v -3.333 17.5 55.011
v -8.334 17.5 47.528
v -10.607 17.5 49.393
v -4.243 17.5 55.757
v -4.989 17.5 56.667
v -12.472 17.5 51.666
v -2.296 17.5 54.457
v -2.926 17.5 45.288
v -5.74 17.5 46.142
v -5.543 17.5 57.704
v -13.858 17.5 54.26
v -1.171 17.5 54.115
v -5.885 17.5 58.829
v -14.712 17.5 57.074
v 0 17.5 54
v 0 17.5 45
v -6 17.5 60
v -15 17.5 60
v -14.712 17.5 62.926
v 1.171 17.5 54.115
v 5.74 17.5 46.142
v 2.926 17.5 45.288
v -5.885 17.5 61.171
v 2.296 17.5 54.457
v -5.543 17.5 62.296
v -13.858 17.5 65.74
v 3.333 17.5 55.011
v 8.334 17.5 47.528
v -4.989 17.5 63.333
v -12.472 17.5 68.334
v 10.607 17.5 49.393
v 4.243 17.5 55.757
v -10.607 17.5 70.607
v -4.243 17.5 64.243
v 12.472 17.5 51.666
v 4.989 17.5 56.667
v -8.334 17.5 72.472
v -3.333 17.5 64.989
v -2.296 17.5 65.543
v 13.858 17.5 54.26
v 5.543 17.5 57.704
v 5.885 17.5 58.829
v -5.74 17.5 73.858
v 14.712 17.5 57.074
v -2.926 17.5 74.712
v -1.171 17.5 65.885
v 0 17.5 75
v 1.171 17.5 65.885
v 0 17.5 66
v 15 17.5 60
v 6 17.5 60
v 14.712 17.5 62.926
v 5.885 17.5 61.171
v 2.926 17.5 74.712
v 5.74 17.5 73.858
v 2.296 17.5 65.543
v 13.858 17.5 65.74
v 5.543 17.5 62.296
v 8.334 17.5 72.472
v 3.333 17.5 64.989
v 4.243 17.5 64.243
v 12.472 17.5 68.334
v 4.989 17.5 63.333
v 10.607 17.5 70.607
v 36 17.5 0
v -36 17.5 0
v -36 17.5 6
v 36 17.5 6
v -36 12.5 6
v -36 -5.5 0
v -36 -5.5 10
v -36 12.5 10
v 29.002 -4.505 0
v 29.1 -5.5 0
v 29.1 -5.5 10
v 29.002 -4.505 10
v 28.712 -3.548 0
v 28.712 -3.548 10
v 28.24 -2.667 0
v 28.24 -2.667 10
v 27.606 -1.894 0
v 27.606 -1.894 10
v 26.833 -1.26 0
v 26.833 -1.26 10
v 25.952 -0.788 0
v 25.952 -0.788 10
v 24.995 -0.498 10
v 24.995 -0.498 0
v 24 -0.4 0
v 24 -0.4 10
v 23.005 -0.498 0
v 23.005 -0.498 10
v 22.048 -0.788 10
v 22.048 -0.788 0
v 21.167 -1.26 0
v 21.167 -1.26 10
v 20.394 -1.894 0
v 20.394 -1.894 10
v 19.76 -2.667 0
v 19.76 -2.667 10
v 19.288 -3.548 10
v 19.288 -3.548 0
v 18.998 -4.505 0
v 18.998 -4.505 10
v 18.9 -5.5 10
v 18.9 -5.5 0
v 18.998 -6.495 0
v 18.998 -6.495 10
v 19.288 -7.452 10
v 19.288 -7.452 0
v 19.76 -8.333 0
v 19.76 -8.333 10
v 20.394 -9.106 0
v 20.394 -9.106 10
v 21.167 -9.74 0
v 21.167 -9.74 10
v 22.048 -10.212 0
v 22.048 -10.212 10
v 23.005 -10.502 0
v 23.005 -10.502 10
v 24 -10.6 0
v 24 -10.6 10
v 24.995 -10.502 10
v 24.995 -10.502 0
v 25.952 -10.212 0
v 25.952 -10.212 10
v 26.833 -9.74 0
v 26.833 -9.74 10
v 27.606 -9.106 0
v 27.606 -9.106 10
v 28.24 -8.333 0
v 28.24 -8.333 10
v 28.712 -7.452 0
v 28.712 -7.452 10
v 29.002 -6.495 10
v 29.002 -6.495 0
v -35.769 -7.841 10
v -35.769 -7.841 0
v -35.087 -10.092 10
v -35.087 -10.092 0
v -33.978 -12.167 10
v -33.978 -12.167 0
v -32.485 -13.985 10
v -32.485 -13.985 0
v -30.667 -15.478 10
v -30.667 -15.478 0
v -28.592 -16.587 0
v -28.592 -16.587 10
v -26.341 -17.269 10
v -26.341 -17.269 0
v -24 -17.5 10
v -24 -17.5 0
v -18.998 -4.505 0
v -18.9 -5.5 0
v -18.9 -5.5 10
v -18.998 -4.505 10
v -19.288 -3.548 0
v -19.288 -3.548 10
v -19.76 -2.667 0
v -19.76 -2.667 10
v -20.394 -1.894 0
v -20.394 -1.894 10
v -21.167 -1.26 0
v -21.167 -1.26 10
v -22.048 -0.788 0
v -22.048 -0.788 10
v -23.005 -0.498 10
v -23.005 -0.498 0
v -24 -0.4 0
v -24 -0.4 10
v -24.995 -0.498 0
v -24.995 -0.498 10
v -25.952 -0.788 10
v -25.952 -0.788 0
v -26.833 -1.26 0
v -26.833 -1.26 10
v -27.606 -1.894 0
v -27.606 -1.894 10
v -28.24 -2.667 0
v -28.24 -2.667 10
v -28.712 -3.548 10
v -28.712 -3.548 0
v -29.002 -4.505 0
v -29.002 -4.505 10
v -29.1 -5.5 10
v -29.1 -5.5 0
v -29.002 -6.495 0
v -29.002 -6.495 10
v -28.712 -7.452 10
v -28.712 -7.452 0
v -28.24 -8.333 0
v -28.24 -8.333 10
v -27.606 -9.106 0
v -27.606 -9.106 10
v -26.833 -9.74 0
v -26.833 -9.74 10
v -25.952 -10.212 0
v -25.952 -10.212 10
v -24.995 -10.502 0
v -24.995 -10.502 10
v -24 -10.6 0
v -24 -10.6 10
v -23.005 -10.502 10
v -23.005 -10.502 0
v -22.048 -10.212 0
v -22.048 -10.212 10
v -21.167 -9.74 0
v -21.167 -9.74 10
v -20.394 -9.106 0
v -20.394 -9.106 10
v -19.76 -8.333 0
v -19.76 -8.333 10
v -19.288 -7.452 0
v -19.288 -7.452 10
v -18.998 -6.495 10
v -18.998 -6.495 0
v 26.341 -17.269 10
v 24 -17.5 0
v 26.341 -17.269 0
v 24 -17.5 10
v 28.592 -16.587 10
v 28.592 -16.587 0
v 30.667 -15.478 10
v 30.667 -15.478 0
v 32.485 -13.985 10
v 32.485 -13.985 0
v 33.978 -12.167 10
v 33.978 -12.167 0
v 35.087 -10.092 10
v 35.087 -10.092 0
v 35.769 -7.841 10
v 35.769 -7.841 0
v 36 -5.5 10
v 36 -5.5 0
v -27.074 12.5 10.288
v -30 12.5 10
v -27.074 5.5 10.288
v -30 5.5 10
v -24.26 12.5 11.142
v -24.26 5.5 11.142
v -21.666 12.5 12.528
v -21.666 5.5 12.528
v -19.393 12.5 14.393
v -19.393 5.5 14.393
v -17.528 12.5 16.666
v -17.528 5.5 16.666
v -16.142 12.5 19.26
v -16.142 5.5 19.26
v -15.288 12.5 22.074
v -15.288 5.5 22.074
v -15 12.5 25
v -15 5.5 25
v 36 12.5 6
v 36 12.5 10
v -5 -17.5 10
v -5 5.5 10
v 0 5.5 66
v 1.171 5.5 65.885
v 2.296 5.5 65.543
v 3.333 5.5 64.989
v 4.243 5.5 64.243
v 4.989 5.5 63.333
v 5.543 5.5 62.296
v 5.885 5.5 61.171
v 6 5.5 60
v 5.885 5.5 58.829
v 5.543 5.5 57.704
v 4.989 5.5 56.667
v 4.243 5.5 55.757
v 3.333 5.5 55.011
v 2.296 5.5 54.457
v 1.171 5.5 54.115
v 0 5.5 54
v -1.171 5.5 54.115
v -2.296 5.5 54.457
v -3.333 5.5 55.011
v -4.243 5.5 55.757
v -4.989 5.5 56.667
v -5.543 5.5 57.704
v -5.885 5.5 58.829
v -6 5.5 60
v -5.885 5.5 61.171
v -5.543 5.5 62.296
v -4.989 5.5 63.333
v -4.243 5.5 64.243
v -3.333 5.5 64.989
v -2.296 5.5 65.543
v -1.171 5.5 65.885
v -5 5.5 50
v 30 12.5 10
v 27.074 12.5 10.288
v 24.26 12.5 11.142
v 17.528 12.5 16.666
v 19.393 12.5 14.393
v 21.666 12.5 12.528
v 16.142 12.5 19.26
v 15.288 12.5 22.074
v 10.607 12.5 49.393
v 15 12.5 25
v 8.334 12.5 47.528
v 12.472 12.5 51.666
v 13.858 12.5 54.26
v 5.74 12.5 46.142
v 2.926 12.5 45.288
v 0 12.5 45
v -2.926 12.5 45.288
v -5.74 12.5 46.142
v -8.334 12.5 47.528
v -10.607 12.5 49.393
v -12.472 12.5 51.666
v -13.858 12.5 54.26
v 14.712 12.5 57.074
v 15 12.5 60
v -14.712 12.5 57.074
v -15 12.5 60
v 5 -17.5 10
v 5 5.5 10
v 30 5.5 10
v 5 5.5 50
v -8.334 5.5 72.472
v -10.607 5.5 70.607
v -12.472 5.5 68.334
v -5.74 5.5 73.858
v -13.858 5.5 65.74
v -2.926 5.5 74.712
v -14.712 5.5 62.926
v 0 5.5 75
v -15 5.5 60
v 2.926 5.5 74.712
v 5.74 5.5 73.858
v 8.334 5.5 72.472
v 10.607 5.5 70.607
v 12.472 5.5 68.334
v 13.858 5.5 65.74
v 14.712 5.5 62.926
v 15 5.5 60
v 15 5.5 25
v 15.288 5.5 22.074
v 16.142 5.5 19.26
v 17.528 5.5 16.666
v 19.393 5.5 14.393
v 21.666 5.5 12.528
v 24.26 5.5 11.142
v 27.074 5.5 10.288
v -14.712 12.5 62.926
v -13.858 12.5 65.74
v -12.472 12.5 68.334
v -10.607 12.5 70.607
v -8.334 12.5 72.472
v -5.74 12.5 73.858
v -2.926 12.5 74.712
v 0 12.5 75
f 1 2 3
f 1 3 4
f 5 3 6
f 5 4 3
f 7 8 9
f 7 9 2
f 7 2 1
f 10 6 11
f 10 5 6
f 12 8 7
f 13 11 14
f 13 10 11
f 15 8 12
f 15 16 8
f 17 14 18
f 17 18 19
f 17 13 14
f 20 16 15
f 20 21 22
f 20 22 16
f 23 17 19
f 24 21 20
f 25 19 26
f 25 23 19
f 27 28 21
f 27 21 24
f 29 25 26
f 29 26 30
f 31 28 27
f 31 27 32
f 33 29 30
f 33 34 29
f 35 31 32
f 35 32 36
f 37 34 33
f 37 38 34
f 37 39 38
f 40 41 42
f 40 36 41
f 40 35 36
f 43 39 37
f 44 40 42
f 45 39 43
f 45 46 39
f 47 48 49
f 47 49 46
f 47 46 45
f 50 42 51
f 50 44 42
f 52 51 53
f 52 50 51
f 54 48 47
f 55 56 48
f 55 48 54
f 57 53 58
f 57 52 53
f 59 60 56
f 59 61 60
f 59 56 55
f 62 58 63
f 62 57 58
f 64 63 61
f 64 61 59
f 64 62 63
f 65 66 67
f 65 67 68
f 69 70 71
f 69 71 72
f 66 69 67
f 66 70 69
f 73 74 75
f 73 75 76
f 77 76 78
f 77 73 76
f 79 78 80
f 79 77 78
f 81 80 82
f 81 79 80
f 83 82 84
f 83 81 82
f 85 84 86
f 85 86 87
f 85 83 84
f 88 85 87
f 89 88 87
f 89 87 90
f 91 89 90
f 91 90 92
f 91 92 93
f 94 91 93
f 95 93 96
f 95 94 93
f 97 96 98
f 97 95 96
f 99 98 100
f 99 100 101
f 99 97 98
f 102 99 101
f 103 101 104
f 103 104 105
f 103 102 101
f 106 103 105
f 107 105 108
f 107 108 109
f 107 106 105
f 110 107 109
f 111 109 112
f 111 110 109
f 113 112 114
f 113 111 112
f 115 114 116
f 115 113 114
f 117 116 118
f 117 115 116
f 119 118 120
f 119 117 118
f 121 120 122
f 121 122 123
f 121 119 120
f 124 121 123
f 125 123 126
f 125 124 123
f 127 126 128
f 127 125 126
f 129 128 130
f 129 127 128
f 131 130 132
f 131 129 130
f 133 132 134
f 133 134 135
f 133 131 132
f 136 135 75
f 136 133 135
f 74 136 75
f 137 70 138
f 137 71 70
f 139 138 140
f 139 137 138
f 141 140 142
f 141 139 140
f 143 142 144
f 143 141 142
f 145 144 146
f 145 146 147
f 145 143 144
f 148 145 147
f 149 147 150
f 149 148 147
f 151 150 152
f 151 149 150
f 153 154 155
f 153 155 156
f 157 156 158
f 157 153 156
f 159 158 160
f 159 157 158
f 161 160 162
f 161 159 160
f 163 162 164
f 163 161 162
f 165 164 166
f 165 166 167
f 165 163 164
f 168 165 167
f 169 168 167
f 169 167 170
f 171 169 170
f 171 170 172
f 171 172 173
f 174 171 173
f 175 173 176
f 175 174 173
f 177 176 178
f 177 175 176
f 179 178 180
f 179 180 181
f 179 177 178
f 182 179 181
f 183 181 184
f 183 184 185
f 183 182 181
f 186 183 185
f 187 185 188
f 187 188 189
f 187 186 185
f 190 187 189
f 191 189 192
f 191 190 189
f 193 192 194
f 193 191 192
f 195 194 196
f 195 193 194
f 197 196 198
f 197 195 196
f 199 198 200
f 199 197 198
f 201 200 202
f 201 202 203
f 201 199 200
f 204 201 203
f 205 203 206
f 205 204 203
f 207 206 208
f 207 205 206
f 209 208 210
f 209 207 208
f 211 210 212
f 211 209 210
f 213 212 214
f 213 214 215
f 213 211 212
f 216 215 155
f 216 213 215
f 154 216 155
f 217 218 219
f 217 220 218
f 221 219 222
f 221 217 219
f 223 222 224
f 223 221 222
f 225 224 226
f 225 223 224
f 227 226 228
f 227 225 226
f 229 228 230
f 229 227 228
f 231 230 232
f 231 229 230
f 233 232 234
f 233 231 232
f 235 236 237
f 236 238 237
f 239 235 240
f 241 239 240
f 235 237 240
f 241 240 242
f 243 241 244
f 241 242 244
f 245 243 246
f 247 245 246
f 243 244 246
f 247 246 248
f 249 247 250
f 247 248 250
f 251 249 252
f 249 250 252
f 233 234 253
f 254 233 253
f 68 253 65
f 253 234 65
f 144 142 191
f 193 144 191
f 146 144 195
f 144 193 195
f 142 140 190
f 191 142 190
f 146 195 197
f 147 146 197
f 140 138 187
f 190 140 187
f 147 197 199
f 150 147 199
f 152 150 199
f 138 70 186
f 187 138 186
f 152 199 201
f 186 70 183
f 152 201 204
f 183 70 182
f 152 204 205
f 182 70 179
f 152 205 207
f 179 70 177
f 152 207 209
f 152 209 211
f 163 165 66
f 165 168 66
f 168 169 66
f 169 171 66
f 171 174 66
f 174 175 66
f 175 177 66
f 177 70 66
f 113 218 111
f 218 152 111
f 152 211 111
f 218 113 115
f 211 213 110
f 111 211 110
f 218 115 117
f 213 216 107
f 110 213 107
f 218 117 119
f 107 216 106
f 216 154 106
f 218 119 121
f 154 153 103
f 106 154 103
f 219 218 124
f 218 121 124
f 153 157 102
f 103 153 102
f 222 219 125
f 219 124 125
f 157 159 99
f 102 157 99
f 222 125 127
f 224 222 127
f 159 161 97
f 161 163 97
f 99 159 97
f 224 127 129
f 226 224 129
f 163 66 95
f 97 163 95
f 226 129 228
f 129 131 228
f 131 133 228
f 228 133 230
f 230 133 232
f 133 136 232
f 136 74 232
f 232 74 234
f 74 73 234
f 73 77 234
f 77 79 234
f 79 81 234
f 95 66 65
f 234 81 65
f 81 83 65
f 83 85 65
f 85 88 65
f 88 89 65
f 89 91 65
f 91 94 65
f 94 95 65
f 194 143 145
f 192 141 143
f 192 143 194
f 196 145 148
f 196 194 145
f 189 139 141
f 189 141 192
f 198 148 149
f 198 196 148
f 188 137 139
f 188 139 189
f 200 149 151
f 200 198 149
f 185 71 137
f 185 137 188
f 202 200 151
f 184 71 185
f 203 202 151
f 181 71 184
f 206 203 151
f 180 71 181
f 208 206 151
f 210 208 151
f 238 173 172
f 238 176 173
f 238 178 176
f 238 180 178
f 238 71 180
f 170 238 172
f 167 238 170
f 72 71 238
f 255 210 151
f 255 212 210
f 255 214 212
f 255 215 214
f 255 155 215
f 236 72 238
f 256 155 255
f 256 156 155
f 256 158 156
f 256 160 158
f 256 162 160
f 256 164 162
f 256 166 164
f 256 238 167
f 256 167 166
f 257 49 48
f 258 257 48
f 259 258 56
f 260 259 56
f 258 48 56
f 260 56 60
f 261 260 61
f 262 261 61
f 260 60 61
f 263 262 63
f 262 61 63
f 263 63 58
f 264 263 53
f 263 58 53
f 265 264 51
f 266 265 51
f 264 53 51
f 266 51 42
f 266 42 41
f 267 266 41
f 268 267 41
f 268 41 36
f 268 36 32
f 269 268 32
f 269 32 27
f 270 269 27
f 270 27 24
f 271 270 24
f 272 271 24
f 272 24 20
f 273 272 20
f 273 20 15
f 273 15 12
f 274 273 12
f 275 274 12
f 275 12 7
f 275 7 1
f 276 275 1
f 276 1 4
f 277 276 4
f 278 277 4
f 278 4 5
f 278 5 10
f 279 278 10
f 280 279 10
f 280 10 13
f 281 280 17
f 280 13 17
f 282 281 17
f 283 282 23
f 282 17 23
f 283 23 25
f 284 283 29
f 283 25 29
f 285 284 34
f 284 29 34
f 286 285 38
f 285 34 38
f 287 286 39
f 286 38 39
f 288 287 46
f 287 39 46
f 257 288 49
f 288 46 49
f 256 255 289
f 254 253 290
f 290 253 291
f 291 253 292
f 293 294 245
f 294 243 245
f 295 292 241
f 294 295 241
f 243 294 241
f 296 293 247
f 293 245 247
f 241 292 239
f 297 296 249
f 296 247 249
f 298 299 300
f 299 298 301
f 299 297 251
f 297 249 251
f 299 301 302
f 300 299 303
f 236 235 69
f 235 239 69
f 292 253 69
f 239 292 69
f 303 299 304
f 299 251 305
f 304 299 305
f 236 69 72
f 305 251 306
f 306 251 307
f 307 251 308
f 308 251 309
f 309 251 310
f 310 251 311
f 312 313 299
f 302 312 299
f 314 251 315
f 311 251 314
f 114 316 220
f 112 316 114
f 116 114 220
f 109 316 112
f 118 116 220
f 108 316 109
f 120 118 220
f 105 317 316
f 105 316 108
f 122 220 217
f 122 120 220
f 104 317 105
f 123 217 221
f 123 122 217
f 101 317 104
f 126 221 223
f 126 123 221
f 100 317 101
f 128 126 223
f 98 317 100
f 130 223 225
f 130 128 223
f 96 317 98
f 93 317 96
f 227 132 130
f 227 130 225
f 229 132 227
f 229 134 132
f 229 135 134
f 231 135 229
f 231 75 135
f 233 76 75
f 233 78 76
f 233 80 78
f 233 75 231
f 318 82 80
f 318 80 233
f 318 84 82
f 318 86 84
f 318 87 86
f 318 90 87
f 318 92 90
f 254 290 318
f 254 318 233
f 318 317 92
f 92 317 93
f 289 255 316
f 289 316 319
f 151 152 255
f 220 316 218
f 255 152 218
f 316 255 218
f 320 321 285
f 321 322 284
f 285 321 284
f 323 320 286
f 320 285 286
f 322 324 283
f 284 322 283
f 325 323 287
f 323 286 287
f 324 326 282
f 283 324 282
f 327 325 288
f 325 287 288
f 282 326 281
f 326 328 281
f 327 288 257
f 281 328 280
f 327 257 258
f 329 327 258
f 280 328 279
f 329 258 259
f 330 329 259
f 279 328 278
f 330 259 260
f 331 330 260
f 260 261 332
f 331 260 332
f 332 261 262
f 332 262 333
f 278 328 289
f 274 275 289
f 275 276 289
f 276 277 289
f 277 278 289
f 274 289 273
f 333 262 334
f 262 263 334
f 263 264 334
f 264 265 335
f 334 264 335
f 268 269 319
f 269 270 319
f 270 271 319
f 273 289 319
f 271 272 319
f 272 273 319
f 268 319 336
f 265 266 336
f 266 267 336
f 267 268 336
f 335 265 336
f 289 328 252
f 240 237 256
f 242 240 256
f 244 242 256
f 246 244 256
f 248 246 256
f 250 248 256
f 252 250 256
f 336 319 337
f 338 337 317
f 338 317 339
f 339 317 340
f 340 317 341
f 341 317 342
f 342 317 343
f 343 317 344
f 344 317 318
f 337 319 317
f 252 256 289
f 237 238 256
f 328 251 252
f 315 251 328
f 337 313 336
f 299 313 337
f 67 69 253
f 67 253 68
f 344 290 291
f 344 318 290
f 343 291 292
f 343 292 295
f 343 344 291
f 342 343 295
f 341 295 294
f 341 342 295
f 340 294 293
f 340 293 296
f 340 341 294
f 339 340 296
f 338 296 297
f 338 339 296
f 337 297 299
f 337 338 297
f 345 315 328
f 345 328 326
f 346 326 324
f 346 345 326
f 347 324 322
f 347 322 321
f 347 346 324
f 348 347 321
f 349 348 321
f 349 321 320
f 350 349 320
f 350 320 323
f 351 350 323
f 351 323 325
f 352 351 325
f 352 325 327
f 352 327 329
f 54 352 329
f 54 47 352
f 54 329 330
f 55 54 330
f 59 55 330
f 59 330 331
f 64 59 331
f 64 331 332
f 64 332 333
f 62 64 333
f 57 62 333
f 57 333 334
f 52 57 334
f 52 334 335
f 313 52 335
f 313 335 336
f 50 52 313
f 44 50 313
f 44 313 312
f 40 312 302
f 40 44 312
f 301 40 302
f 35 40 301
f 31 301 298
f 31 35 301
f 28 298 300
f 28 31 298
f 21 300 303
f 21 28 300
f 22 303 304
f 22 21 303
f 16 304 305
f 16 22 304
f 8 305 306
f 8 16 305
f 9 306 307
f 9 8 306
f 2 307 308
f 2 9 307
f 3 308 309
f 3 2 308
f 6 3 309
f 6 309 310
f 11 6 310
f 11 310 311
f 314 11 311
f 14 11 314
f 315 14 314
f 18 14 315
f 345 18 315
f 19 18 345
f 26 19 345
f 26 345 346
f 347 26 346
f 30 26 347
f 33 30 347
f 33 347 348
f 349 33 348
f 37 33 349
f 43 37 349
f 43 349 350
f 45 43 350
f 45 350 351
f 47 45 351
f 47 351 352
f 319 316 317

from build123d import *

# Parameters (mm, degrees)
CROQUIS1_W              = 72
CROQUIS1_H              = 35
CROQUIS1_R              = 5.1
SALIENTE_EXTRUIR1_DEPTH = 10
REDONDEO1_R             = 12
CORTAR_EXTRUIR1_REACH   = 76.768
CROQUIS2_W              = 4
CROQUIS2_H              = 5
CROQUIS3_R              = 6
SALIENTE_EXTRUIR2_DEPTH = 7
SALIENTE_EXTRUIR4_START = 5
CROQUIS5_R              = 15
CROQUIS5_R_2            = 6
SALIENTE_EXTRUIR4_DEPTH = 5
REDONDEO2_R             = 15
NERVIO31_REACH          = 87.013
CROQUIS8_WALL_W         = 218.167556508
CROQUIS8_WALL_H         = 10


with BuildPart() as part:
    # Croquis1 → Saliente-Extruir1 (new body)
    with BuildSketch(Plane.XY):
        Rectangle(CROQUIS1_W, CROQUIS1_H)
        with Locations((-24, -5.5)):
            Circle(CROQUIS1_R, mode=Mode.SUBTRACT)
        with Locations((24, -5.5)):
            Circle(CROQUIS1_R, mode=Mode.SUBTRACT)
    extrude(amount=SALIENTE_EXTRUIR1_DEPTH)

    # Redondeo1
    redondeo1_edges = [part.edges().sort_by_distance(p)[0] for p in [
        (36, -17.5, 5),
        (-36, -17.5, 5),
    ]]
    fillet(redondeo1_edges, radius=REDONDEO1_R)

    # Croquis2 → Cortar-Extruir1 (cut, up to next)
    with BuildSketch(Plane.ZY.offset(36), mode=Mode.PRIVATE) as cortar_extruir1_sk1:
        with Locations((8, 15)):
            Rectangle(CROQUIS2_W, CROQUIS2_H)
    cortar_extruir1_tool1 = extrude(cortar_extruir1_sk1.sketch, amount=-CORTAR_EXTRUIR1_REACH, mode=Mode.PRIVATE) & part.part
    add(cortar_extruir1_tool1.solids().sort_by_distance((-36, 15, 8))[0], mode=Mode.SUBTRACT)

    # Croquis3 → Saliente-Extruir2 (add)
    with BuildSketch(Plane(origin=(0, 12.5, 0), x_dir=(1, 0, 0), z_dir=(0, 1, 0))):
        with BuildLine():
            Line((15, -60), (15, -10))
            Line((15, -10), (-15, -10))
            Line((-15, -10), (-15, -60))
            ThreePointArc((-15, -60), (0, -75), (15, -60))
        make_face()
        with Locations(Location((0, -60, 0), (0, 0, 270))):
            Circle(CROQUIS3_R, mode=Mode.SUBTRACT)
    extrude(amount=-SALIENTE_EXTRUIR2_DEPTH)

    # Croquis5 → Saliente-Extruir4 (add)
    with BuildSketch(Plane(origin=(0, 12.5, 0), x_dir=(1, 0, 0), z_dir=(0, 1, 0)).offset(SALIENTE_EXTRUIR4_START)):
        with Locations(Location((0, -60, 0), (0, 0, 270))):
            Circle(CROQUIS5_R)
        with Locations(Location((0, -60, 0), (0, 0, 270))):
            Circle(CROQUIS5_R_2, mode=Mode.SUBTRACT)
    extrude(amount=-SALIENTE_EXTRUIR4_DEPTH)

    # Redondeo2
    redondeo2_edges = [part.edges().sort_by_distance(p)[0] for p in [
        (-15, 9, 10),
        (15, 9, 10),
    ]]
    fillet(redondeo2_edges, radius=REDONDEO2_R)

    # Croquis8 wall → Nervio31 (add, up to next)
    with BuildSketch(Plane(origin=(0, -6, 30), x_dir=(0, 0.498471124258, 0.866906303058), z_dir=(0, -0.866906303058, 0.498471124258)), mode=Mode.PRIVATE) as nervio31_sk1:
        Rectangle(CROQUIS8_WALL_W, CROQUIS8_WALL_H)
    nervio31_tool1 = extrude(nervio31_sk1.sketch, amount=-NERVIO31_REACH, mode=Mode.PRIVATE) - part.part
    add(nervio31_tool1.solids().sort_by_distance((0, -6, 30))[0])


solid = part.part
